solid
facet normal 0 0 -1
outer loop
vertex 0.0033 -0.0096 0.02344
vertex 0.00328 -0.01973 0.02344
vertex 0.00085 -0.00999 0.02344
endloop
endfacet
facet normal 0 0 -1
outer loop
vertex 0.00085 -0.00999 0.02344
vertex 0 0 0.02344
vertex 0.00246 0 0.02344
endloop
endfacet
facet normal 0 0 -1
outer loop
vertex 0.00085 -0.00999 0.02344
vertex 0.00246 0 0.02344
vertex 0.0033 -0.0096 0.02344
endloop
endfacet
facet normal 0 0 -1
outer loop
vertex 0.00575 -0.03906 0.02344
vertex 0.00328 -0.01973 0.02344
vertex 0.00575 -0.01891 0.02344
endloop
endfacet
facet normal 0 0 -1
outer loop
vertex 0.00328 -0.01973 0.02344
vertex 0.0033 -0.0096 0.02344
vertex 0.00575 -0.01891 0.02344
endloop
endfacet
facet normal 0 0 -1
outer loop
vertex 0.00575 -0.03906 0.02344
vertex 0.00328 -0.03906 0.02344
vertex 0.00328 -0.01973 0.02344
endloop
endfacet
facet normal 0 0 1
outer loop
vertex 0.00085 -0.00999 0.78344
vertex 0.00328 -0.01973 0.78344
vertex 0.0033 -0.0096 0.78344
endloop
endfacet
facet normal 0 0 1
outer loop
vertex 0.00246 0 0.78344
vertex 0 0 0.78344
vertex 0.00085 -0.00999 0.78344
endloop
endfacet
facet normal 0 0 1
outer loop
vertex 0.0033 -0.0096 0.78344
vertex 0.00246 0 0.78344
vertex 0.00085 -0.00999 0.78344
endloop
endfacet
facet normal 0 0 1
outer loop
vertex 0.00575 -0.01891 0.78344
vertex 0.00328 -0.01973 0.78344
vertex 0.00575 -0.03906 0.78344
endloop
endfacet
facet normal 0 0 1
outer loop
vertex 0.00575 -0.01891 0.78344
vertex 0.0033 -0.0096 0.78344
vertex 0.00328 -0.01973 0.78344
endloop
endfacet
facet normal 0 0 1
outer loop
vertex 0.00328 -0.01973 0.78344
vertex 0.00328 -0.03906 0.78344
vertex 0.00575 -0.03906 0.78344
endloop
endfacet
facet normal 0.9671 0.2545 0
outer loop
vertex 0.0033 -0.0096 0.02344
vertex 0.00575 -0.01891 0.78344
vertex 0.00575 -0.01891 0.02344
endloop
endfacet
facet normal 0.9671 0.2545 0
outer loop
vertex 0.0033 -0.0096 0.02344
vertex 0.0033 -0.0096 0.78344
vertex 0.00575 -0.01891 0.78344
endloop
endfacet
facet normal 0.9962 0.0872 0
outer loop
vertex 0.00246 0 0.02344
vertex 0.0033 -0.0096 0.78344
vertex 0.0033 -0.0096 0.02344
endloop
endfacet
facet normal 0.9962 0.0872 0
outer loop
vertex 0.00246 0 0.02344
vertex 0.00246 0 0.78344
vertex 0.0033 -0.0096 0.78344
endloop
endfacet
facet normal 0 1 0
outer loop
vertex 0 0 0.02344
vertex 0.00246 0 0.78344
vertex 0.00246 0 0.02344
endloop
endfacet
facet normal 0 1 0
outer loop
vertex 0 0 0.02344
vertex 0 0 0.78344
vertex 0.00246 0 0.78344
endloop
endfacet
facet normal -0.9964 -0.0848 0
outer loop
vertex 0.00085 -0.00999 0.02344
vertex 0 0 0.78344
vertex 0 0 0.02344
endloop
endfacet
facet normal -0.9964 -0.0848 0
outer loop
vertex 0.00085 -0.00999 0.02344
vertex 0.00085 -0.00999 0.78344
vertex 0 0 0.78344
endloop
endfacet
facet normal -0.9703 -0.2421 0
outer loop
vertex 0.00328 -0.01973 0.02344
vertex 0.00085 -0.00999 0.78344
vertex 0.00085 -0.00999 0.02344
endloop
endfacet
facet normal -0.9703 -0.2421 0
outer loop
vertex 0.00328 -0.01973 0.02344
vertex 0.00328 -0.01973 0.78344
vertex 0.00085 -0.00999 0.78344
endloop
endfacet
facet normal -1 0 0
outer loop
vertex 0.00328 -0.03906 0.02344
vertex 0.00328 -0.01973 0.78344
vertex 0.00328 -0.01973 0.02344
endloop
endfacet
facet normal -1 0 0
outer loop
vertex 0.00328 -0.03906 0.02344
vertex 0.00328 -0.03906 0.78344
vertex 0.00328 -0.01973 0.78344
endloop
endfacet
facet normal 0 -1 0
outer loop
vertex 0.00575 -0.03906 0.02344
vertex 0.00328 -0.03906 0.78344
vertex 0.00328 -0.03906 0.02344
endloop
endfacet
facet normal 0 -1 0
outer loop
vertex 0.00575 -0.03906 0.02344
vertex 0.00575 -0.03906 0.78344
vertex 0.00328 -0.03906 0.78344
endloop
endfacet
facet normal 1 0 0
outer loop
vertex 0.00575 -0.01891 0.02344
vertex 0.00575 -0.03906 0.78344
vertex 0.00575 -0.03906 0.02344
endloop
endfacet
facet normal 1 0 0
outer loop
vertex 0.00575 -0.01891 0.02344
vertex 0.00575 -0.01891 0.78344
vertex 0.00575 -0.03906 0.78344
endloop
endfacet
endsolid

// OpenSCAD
EPS = 0.01;

module sketch0() {
    translate([0, 0, 0.0234375])
    linear_extrude(height=0.75 + EPS)
    polygon(points=[
        [0.0, 0.0],
        [0.0008558886926831073, -0.009999895744201938],
        [0.003289473684210526, -0.019736842105263157],
        [0.003289473684210526, -0.0390625],
        [0.005756578947368421, -0.0390625],
        [0.005756578947368421, -0.018914473684210526],
        [0.0032974335618645503, -0.009598873110522415],
        [0.0024671052631578946, 0.0],
        [0.0, 0.0]
    ]);
}

module sketch1() {
    translate([0.75, 0, 0.0234375])
    linear_extrude(height=-0.75 - EPS)
    polygon(points=[
        [0.0, 0.0],
        [0.000643017198702741, -0.007925809014733722],
        [0.002631578947368421, -0.015625],
        [0.002631578947368421, 0.0],
        [0.0, 0.0]
    ]);
}

union() {
    sketch0();
    sketch1();
}
